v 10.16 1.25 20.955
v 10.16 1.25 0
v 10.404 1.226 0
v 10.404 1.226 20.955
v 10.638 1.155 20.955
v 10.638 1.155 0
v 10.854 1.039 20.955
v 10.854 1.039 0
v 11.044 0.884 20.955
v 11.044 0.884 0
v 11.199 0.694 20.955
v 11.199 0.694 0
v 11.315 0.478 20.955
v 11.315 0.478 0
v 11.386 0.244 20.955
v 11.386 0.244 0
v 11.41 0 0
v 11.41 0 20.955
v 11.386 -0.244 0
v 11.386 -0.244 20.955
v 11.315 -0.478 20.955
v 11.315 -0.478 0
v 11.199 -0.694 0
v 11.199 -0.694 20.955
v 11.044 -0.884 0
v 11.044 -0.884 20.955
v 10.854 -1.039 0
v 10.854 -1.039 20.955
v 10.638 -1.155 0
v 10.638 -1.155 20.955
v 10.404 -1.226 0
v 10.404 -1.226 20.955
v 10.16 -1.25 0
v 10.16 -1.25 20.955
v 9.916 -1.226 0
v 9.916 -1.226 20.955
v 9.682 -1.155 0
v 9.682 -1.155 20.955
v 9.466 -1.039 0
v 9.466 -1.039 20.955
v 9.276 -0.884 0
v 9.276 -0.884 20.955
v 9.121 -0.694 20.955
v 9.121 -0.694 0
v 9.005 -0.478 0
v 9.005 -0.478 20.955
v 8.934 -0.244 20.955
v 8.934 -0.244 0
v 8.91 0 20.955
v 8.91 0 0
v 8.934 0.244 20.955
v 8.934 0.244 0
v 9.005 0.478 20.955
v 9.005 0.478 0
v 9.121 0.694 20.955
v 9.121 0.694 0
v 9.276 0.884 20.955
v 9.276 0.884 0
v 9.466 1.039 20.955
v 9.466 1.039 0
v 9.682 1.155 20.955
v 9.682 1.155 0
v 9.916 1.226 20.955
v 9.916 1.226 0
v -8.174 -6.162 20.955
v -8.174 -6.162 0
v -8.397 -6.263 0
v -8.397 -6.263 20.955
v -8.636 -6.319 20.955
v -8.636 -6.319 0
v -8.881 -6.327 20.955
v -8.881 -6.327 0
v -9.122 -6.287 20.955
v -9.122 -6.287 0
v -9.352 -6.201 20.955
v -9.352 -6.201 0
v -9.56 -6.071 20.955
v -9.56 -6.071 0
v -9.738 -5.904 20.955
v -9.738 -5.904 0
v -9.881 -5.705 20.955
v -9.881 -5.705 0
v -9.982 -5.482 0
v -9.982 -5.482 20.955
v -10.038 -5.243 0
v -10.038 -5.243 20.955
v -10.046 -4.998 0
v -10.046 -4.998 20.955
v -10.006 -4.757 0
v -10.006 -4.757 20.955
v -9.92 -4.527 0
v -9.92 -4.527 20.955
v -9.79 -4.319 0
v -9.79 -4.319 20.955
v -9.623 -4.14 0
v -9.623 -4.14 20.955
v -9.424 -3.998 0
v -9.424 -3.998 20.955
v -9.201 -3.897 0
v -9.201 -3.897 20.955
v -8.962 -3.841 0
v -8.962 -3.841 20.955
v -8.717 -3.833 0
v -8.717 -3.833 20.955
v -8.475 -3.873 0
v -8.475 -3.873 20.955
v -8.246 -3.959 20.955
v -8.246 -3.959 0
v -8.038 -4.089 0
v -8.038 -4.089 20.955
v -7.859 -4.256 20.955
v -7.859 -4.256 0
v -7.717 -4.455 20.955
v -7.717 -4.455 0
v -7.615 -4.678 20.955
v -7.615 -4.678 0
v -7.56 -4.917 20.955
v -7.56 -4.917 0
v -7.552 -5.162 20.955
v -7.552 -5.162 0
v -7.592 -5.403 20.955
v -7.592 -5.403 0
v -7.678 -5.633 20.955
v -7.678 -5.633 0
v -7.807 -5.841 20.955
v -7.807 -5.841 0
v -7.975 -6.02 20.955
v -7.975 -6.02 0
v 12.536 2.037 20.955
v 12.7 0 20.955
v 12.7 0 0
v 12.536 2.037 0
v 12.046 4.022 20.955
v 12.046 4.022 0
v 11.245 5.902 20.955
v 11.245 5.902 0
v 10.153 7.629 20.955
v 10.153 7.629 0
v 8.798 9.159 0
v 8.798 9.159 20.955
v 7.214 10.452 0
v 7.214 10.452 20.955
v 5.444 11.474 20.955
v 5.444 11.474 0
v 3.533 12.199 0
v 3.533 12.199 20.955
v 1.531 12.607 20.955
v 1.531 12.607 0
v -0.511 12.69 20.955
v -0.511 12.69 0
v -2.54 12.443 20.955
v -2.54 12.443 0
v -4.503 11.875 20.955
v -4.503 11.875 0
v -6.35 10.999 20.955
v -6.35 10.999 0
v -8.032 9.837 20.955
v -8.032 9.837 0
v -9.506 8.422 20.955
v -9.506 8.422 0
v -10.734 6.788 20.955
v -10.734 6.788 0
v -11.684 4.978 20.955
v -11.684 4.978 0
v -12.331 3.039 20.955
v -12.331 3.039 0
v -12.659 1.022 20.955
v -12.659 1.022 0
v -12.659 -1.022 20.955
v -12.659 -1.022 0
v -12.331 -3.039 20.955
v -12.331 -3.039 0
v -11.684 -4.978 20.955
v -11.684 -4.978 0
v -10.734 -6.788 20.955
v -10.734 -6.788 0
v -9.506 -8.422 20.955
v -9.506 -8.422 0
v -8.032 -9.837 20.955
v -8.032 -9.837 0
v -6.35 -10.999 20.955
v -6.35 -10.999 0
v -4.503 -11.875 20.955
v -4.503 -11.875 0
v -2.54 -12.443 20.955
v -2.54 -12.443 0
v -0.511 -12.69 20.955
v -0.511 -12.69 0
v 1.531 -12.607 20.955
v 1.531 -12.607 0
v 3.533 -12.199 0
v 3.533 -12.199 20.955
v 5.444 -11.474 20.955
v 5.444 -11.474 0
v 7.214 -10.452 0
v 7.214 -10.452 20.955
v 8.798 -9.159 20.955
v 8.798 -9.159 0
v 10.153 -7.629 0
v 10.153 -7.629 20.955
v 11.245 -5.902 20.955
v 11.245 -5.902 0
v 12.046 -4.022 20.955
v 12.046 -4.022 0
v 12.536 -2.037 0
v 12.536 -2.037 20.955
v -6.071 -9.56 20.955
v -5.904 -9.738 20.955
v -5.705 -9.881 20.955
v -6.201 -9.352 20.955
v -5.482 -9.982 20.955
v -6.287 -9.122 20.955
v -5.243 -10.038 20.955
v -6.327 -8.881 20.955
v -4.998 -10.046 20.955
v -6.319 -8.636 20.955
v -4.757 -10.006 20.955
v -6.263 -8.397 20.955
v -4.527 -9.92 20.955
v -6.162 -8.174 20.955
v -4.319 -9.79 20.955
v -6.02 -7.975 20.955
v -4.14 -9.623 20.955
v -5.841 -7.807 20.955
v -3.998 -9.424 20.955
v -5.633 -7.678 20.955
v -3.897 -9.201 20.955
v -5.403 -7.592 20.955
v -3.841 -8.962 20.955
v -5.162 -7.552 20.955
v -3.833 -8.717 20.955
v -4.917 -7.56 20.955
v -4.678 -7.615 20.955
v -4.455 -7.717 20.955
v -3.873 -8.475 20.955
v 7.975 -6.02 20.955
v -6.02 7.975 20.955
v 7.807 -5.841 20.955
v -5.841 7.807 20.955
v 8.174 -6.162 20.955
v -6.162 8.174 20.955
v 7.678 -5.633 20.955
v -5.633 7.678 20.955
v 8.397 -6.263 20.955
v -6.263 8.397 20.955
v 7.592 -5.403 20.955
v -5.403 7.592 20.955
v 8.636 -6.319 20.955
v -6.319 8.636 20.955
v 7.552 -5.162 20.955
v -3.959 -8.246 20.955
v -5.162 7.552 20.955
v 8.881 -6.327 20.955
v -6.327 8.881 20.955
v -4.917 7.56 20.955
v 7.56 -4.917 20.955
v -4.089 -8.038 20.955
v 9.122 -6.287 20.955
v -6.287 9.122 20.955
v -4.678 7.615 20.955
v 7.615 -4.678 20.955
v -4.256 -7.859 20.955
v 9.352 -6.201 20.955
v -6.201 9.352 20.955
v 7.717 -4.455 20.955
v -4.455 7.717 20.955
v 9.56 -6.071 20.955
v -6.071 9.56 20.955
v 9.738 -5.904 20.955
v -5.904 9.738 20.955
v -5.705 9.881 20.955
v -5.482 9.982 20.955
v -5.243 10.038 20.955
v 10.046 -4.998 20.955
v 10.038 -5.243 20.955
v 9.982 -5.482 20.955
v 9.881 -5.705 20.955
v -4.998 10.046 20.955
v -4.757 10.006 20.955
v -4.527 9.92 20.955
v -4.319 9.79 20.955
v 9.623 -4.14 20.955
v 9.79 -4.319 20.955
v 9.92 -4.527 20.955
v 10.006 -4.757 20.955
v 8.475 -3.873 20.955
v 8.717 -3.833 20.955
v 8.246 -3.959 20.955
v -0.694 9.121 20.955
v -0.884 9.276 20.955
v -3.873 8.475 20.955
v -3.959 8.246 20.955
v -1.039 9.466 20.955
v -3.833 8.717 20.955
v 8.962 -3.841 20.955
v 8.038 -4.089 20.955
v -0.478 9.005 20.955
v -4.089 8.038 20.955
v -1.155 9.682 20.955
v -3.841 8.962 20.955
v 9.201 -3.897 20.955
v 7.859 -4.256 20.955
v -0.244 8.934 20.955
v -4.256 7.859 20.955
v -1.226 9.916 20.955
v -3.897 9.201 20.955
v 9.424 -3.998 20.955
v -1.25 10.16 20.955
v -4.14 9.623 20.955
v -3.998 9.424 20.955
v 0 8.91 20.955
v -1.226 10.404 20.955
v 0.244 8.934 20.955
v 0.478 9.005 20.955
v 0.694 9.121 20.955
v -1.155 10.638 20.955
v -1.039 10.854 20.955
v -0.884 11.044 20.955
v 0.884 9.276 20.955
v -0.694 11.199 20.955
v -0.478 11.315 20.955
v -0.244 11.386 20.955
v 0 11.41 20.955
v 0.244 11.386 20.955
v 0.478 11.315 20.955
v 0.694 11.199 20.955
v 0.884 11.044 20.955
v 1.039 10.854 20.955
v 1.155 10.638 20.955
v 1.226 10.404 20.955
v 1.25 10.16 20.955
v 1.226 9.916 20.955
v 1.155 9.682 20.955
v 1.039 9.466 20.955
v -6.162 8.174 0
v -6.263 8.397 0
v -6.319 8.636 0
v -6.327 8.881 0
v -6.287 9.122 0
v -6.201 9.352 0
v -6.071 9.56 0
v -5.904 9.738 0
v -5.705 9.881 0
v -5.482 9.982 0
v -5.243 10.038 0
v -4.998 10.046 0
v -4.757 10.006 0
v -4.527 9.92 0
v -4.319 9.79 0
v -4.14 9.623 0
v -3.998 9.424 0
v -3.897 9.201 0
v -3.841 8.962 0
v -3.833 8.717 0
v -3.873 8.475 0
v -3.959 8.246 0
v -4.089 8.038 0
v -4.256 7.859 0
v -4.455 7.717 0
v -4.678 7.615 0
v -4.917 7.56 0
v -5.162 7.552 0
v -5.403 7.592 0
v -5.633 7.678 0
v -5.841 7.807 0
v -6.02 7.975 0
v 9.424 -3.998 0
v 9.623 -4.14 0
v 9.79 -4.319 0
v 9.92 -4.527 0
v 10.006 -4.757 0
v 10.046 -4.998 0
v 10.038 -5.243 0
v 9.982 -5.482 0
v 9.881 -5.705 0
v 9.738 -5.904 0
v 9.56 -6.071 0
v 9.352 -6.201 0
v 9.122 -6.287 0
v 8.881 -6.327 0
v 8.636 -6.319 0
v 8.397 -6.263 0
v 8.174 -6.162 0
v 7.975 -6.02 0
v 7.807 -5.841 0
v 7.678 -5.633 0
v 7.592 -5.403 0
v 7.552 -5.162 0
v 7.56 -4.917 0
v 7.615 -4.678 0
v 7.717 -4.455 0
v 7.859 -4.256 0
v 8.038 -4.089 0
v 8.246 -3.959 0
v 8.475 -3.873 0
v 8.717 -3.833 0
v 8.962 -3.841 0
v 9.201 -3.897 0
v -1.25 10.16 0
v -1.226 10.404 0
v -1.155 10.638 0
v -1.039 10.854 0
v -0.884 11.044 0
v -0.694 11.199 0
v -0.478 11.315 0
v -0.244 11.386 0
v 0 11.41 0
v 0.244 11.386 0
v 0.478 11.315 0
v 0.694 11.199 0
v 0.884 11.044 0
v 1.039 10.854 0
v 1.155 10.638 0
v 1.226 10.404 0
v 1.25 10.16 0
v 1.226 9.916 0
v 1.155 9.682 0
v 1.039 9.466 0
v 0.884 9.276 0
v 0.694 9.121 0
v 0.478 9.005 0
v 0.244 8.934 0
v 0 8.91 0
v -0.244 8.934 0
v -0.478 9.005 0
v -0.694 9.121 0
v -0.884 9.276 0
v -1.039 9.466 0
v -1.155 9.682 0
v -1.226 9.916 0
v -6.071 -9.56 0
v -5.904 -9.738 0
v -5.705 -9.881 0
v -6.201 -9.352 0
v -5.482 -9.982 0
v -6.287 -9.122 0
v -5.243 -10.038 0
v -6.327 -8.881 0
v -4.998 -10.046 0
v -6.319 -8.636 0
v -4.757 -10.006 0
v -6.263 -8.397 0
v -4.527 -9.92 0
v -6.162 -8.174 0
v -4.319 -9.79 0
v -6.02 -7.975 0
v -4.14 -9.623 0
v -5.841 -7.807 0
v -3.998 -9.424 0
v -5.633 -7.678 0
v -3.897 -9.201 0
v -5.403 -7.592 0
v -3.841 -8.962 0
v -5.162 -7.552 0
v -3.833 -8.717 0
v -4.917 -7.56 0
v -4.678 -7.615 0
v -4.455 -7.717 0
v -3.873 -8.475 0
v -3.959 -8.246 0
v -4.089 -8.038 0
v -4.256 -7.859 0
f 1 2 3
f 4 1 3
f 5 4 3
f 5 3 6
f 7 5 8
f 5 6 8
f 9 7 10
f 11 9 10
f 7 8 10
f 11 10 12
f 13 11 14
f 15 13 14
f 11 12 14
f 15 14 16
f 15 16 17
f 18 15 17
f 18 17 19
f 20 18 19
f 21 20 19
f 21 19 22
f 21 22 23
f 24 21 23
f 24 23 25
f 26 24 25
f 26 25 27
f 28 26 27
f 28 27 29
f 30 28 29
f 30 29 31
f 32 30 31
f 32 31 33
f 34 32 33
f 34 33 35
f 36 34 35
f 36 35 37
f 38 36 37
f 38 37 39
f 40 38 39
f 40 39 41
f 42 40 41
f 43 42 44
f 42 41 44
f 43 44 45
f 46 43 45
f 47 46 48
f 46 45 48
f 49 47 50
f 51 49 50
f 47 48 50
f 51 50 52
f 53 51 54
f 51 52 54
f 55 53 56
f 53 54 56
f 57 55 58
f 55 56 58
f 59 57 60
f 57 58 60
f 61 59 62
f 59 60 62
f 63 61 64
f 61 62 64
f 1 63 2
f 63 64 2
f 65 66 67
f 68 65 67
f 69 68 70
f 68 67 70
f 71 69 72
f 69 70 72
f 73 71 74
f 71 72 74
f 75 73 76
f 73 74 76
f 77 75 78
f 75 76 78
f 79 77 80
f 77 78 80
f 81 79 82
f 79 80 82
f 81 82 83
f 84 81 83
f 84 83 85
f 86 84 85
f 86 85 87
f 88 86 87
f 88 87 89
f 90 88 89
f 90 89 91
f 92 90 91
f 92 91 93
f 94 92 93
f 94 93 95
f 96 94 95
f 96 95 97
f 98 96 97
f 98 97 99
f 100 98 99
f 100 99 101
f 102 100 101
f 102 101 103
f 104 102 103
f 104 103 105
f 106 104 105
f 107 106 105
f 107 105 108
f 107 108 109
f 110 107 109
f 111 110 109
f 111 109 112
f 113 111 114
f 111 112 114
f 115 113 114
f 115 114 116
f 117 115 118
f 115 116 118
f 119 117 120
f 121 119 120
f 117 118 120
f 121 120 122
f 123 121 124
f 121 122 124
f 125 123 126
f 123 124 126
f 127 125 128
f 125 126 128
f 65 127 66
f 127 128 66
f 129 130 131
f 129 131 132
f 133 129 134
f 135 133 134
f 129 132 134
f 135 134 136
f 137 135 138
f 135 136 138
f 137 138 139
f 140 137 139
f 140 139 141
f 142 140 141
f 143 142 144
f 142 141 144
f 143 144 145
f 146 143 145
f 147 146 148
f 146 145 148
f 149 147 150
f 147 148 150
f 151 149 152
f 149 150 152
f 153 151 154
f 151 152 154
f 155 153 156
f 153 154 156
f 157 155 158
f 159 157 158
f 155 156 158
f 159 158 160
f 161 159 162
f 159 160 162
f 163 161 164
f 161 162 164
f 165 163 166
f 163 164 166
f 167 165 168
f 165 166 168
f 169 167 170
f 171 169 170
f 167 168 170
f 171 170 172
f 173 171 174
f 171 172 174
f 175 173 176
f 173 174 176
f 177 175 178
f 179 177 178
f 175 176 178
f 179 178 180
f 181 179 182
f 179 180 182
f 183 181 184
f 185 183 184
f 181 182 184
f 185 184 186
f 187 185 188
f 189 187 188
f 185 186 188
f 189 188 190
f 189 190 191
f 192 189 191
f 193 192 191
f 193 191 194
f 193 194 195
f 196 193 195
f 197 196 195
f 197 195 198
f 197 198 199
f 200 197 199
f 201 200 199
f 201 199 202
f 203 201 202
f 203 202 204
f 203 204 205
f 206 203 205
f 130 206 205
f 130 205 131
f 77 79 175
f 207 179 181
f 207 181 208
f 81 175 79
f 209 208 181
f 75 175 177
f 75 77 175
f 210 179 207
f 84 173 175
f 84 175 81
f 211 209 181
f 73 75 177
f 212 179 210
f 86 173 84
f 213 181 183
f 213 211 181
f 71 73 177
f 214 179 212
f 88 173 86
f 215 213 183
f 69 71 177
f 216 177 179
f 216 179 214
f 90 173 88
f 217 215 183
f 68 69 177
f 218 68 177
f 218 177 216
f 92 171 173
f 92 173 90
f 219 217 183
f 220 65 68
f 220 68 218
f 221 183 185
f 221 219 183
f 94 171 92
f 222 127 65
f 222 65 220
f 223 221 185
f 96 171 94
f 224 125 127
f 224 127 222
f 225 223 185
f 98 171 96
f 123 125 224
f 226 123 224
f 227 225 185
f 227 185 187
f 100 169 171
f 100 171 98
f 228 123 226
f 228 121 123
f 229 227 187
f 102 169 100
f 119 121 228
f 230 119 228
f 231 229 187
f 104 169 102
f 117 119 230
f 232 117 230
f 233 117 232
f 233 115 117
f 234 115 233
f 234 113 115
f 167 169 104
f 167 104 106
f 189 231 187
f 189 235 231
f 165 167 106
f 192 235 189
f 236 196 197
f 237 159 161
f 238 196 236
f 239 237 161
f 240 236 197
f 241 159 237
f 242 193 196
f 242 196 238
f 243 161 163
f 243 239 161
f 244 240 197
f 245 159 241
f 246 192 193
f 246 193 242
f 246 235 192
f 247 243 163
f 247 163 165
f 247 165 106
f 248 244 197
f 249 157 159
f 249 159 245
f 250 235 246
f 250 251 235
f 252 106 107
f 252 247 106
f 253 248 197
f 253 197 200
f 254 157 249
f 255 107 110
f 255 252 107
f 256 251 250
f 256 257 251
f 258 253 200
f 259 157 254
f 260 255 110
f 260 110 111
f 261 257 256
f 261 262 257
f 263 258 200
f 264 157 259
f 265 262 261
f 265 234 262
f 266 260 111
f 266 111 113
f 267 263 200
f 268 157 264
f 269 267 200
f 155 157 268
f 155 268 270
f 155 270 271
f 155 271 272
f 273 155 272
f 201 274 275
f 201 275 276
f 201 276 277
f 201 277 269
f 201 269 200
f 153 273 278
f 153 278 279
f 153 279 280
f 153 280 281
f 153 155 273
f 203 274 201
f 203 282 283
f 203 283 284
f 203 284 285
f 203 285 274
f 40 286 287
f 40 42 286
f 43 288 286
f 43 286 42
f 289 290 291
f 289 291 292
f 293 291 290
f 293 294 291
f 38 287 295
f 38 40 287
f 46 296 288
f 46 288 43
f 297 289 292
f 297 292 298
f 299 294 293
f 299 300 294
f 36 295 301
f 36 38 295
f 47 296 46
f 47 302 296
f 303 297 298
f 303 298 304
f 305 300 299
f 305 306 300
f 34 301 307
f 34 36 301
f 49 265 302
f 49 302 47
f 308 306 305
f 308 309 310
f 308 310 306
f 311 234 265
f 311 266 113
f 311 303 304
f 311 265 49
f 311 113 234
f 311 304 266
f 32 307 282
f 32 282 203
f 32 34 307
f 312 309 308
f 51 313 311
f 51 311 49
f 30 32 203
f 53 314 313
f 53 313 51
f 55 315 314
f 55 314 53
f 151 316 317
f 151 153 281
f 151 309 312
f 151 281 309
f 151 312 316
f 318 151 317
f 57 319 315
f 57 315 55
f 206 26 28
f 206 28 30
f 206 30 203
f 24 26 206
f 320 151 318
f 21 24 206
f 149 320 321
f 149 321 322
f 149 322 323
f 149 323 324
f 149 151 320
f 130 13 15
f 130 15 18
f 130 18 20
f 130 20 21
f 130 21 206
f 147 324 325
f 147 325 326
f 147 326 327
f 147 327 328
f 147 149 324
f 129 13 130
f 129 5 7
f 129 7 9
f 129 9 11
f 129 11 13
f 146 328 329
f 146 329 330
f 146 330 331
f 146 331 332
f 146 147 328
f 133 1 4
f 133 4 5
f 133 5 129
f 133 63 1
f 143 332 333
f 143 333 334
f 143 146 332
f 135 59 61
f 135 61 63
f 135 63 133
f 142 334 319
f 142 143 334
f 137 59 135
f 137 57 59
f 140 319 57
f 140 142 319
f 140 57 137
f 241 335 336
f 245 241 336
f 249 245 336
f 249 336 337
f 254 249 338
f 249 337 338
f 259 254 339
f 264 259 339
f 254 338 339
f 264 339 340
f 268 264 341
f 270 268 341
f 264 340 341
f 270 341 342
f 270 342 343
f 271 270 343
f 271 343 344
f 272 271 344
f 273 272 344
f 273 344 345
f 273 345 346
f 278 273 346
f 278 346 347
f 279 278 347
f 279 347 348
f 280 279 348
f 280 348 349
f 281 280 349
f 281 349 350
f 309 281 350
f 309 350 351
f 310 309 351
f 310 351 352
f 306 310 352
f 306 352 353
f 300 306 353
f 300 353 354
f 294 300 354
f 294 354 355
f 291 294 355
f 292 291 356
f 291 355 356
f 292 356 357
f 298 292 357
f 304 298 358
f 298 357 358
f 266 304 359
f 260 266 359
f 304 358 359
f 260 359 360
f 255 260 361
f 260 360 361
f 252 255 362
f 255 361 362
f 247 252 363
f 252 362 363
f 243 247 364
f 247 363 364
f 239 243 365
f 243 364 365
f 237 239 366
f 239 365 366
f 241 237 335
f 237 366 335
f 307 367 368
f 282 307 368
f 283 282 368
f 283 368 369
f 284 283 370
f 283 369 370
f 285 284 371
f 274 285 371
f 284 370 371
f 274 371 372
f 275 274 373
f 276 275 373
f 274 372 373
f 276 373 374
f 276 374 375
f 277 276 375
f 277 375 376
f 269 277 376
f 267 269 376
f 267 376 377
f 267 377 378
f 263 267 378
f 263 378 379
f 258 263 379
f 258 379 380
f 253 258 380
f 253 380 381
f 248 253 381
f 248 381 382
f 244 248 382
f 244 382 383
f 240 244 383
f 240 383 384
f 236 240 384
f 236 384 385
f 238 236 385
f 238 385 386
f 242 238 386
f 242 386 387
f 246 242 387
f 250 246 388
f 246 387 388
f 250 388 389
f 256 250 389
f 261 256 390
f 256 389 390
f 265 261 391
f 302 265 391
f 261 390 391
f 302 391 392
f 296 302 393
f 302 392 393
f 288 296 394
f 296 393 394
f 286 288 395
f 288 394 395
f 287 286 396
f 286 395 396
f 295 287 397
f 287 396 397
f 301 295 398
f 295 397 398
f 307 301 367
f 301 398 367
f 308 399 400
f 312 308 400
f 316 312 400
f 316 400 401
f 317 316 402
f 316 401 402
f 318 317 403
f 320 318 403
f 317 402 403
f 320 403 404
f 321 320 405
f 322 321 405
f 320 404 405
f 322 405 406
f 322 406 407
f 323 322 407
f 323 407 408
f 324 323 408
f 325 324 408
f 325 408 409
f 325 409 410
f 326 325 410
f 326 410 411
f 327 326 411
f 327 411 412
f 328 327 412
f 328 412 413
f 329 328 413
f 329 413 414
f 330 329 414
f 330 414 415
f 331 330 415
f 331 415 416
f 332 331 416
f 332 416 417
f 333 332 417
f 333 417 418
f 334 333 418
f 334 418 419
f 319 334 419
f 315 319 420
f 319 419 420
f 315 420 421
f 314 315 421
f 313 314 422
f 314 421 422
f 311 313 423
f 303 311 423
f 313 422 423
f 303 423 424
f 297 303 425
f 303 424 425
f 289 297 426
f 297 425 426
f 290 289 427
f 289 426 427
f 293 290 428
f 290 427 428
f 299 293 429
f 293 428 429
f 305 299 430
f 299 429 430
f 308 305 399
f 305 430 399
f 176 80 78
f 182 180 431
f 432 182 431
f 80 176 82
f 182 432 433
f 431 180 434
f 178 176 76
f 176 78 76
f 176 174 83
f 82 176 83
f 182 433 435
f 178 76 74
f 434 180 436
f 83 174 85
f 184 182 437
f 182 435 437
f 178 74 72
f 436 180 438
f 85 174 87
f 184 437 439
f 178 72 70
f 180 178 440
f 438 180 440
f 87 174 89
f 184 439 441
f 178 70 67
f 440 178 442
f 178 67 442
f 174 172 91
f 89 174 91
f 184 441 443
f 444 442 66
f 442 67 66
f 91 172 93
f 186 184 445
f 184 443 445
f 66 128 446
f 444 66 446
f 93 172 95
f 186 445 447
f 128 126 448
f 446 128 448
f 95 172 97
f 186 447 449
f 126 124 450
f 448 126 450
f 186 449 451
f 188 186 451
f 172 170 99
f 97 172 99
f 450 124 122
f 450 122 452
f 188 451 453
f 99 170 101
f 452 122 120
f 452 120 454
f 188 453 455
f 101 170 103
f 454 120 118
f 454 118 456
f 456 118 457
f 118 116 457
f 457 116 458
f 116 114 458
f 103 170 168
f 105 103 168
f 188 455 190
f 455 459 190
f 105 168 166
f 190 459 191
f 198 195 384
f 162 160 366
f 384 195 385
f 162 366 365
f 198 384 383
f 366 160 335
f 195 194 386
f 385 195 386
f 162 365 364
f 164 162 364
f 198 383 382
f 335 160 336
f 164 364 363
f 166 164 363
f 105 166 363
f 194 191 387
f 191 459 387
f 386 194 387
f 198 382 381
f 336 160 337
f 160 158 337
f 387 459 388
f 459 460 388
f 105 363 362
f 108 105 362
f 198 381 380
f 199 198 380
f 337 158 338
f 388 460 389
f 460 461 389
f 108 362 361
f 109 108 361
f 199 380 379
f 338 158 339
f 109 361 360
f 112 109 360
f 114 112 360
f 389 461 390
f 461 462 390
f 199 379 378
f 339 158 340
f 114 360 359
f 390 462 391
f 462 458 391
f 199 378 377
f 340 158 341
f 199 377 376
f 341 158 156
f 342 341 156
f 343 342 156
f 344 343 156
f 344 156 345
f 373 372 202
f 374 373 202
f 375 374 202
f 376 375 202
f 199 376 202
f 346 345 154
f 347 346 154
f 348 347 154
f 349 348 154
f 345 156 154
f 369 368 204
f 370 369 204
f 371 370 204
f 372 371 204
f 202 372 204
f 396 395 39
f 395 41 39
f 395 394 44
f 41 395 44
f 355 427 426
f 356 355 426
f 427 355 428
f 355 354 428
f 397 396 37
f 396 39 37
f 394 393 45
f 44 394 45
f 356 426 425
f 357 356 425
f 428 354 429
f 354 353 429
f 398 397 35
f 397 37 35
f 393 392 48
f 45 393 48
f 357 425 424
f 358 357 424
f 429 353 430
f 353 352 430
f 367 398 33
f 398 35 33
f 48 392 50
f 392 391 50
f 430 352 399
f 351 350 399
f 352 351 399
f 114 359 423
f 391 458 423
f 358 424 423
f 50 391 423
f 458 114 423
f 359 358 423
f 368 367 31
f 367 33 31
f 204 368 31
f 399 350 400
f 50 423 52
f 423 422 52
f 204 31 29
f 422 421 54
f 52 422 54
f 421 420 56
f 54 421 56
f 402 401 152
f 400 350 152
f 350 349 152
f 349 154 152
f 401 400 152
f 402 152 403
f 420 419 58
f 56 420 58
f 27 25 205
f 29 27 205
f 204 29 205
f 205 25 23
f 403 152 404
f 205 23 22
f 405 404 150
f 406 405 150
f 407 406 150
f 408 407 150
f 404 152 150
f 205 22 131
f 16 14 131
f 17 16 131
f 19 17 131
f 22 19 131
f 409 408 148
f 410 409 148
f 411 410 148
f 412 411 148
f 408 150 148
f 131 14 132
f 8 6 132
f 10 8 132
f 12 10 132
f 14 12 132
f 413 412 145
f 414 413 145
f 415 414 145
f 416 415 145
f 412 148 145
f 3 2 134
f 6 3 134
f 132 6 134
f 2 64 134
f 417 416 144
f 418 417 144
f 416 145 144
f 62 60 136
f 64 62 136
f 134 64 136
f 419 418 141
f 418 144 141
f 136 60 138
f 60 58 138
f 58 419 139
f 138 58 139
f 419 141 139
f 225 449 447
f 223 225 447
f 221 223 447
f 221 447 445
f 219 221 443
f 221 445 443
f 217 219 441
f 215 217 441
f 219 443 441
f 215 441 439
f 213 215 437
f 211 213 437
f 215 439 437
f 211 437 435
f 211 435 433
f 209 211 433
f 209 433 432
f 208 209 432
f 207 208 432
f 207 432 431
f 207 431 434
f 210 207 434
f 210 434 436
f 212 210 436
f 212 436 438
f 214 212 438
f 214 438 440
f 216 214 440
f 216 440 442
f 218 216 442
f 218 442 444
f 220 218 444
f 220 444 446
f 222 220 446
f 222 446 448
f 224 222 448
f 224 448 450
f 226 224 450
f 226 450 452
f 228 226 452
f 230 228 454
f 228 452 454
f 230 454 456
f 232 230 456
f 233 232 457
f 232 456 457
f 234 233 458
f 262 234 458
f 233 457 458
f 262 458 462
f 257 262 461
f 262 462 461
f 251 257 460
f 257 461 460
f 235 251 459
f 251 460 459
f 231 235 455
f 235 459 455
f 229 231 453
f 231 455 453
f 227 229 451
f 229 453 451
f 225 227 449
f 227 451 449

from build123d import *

# Parameters (mm, degrees)
SKETCH1_R                   = 12.7
BOSS_EXTRUDE1_DEPTH         = 20.955
SKETCH2_R                   = 1.24968
CUT_EXTRUDE1_DEPTH          = 25.4
CIRPATTERN1_COUNT           = 3
CIRPATTERN2_COUNT           = 2
CIRPATTERN2_ANGLE           = 30
CIRPATTERN2_COPY_1_SKETCH_R = 1.24968
CIRPATTERN2_COPY_1_DEPTH    = 25.4
CIRPATTERN2_COPY_2_SKETCH_R = 1.24968
CIRPATTERN2_COPY_2_DEPTH    = 25.4


with BuildPart() as part:
    # Sketch1 → Boss-Extrude1 (new body)
    with BuildSketch(Plane.XY):
        Circle(SKETCH1_R)
    extrude(amount=BOSS_EXTRUDE1_DEPTH)

    # Sketch2 → Cut-Extrude1 (cut)
    with BuildSketch(Plane(origin=(0, 0, 0), x_dir=(-1, 0, 0), z_dir=(0, 0, -1))):
        with Locations((0, 10.16)):
            Circle(SKETCH2_R)
    cut_extrude1 = extrude(amount=-CUT_EXTRUDE1_DEPTH, mode=Mode.SUBTRACT)

    # CirPattern1: Cut-Extrude1 ×3 about axis
    cirpattern1_axis = Axis((0, 0, 0), (0, 0, 1))
    for i in range(1, CIRPATTERN1_COUNT):
        add(cut_extrude1.rotate(cirpattern1_axis, i * 360 / CIRPATTERN1_COUNT), mode=Mode.SUBTRACT)

    # CirPattern2: Cut-Extrude1 ×2 about axis
    cirpattern2_axis = Axis((0, 0, 0), (0, 0, 1))
    for i in range(1, CIRPATTERN2_COUNT):
        add(cut_extrude1.rotate(cirpattern2_axis, i * CIRPATTERN2_ANGLE / (CIRPATTERN2_COUNT - 1)), mode=Mode.SUBTRACT)

    # CirPattern2 copy 1 sketch → CirPattern2 copy 1 (cut)
    with BuildSketch(Plane(origin=(0, 0, 0), x_dir=(0.8660254037844392, -0.4999999999999991, 0), z_dir=(0, 0, -1))):
        with Locations((0, 10.16)):
            Circle(CIRPATTERN2_COPY_1_SKETCH_R)
    extrude(amount=-CIRPATTERN2_COPY_1_DEPTH, mode=Mode.SUBTRACT)

    # CirPattern2 copy 2 sketch → CirPattern2 copy 2 (cut)
    with BuildSketch(Plane.YX):
        with Locations((0, 10.16)):
            Circle(CIRPATTERN2_COPY_2_SKETCH_R)
    extrude(amount=-CIRPATTERN2_COPY_2_DEPTH, mode=Mode.SUBTRACT)


solid = part.part
